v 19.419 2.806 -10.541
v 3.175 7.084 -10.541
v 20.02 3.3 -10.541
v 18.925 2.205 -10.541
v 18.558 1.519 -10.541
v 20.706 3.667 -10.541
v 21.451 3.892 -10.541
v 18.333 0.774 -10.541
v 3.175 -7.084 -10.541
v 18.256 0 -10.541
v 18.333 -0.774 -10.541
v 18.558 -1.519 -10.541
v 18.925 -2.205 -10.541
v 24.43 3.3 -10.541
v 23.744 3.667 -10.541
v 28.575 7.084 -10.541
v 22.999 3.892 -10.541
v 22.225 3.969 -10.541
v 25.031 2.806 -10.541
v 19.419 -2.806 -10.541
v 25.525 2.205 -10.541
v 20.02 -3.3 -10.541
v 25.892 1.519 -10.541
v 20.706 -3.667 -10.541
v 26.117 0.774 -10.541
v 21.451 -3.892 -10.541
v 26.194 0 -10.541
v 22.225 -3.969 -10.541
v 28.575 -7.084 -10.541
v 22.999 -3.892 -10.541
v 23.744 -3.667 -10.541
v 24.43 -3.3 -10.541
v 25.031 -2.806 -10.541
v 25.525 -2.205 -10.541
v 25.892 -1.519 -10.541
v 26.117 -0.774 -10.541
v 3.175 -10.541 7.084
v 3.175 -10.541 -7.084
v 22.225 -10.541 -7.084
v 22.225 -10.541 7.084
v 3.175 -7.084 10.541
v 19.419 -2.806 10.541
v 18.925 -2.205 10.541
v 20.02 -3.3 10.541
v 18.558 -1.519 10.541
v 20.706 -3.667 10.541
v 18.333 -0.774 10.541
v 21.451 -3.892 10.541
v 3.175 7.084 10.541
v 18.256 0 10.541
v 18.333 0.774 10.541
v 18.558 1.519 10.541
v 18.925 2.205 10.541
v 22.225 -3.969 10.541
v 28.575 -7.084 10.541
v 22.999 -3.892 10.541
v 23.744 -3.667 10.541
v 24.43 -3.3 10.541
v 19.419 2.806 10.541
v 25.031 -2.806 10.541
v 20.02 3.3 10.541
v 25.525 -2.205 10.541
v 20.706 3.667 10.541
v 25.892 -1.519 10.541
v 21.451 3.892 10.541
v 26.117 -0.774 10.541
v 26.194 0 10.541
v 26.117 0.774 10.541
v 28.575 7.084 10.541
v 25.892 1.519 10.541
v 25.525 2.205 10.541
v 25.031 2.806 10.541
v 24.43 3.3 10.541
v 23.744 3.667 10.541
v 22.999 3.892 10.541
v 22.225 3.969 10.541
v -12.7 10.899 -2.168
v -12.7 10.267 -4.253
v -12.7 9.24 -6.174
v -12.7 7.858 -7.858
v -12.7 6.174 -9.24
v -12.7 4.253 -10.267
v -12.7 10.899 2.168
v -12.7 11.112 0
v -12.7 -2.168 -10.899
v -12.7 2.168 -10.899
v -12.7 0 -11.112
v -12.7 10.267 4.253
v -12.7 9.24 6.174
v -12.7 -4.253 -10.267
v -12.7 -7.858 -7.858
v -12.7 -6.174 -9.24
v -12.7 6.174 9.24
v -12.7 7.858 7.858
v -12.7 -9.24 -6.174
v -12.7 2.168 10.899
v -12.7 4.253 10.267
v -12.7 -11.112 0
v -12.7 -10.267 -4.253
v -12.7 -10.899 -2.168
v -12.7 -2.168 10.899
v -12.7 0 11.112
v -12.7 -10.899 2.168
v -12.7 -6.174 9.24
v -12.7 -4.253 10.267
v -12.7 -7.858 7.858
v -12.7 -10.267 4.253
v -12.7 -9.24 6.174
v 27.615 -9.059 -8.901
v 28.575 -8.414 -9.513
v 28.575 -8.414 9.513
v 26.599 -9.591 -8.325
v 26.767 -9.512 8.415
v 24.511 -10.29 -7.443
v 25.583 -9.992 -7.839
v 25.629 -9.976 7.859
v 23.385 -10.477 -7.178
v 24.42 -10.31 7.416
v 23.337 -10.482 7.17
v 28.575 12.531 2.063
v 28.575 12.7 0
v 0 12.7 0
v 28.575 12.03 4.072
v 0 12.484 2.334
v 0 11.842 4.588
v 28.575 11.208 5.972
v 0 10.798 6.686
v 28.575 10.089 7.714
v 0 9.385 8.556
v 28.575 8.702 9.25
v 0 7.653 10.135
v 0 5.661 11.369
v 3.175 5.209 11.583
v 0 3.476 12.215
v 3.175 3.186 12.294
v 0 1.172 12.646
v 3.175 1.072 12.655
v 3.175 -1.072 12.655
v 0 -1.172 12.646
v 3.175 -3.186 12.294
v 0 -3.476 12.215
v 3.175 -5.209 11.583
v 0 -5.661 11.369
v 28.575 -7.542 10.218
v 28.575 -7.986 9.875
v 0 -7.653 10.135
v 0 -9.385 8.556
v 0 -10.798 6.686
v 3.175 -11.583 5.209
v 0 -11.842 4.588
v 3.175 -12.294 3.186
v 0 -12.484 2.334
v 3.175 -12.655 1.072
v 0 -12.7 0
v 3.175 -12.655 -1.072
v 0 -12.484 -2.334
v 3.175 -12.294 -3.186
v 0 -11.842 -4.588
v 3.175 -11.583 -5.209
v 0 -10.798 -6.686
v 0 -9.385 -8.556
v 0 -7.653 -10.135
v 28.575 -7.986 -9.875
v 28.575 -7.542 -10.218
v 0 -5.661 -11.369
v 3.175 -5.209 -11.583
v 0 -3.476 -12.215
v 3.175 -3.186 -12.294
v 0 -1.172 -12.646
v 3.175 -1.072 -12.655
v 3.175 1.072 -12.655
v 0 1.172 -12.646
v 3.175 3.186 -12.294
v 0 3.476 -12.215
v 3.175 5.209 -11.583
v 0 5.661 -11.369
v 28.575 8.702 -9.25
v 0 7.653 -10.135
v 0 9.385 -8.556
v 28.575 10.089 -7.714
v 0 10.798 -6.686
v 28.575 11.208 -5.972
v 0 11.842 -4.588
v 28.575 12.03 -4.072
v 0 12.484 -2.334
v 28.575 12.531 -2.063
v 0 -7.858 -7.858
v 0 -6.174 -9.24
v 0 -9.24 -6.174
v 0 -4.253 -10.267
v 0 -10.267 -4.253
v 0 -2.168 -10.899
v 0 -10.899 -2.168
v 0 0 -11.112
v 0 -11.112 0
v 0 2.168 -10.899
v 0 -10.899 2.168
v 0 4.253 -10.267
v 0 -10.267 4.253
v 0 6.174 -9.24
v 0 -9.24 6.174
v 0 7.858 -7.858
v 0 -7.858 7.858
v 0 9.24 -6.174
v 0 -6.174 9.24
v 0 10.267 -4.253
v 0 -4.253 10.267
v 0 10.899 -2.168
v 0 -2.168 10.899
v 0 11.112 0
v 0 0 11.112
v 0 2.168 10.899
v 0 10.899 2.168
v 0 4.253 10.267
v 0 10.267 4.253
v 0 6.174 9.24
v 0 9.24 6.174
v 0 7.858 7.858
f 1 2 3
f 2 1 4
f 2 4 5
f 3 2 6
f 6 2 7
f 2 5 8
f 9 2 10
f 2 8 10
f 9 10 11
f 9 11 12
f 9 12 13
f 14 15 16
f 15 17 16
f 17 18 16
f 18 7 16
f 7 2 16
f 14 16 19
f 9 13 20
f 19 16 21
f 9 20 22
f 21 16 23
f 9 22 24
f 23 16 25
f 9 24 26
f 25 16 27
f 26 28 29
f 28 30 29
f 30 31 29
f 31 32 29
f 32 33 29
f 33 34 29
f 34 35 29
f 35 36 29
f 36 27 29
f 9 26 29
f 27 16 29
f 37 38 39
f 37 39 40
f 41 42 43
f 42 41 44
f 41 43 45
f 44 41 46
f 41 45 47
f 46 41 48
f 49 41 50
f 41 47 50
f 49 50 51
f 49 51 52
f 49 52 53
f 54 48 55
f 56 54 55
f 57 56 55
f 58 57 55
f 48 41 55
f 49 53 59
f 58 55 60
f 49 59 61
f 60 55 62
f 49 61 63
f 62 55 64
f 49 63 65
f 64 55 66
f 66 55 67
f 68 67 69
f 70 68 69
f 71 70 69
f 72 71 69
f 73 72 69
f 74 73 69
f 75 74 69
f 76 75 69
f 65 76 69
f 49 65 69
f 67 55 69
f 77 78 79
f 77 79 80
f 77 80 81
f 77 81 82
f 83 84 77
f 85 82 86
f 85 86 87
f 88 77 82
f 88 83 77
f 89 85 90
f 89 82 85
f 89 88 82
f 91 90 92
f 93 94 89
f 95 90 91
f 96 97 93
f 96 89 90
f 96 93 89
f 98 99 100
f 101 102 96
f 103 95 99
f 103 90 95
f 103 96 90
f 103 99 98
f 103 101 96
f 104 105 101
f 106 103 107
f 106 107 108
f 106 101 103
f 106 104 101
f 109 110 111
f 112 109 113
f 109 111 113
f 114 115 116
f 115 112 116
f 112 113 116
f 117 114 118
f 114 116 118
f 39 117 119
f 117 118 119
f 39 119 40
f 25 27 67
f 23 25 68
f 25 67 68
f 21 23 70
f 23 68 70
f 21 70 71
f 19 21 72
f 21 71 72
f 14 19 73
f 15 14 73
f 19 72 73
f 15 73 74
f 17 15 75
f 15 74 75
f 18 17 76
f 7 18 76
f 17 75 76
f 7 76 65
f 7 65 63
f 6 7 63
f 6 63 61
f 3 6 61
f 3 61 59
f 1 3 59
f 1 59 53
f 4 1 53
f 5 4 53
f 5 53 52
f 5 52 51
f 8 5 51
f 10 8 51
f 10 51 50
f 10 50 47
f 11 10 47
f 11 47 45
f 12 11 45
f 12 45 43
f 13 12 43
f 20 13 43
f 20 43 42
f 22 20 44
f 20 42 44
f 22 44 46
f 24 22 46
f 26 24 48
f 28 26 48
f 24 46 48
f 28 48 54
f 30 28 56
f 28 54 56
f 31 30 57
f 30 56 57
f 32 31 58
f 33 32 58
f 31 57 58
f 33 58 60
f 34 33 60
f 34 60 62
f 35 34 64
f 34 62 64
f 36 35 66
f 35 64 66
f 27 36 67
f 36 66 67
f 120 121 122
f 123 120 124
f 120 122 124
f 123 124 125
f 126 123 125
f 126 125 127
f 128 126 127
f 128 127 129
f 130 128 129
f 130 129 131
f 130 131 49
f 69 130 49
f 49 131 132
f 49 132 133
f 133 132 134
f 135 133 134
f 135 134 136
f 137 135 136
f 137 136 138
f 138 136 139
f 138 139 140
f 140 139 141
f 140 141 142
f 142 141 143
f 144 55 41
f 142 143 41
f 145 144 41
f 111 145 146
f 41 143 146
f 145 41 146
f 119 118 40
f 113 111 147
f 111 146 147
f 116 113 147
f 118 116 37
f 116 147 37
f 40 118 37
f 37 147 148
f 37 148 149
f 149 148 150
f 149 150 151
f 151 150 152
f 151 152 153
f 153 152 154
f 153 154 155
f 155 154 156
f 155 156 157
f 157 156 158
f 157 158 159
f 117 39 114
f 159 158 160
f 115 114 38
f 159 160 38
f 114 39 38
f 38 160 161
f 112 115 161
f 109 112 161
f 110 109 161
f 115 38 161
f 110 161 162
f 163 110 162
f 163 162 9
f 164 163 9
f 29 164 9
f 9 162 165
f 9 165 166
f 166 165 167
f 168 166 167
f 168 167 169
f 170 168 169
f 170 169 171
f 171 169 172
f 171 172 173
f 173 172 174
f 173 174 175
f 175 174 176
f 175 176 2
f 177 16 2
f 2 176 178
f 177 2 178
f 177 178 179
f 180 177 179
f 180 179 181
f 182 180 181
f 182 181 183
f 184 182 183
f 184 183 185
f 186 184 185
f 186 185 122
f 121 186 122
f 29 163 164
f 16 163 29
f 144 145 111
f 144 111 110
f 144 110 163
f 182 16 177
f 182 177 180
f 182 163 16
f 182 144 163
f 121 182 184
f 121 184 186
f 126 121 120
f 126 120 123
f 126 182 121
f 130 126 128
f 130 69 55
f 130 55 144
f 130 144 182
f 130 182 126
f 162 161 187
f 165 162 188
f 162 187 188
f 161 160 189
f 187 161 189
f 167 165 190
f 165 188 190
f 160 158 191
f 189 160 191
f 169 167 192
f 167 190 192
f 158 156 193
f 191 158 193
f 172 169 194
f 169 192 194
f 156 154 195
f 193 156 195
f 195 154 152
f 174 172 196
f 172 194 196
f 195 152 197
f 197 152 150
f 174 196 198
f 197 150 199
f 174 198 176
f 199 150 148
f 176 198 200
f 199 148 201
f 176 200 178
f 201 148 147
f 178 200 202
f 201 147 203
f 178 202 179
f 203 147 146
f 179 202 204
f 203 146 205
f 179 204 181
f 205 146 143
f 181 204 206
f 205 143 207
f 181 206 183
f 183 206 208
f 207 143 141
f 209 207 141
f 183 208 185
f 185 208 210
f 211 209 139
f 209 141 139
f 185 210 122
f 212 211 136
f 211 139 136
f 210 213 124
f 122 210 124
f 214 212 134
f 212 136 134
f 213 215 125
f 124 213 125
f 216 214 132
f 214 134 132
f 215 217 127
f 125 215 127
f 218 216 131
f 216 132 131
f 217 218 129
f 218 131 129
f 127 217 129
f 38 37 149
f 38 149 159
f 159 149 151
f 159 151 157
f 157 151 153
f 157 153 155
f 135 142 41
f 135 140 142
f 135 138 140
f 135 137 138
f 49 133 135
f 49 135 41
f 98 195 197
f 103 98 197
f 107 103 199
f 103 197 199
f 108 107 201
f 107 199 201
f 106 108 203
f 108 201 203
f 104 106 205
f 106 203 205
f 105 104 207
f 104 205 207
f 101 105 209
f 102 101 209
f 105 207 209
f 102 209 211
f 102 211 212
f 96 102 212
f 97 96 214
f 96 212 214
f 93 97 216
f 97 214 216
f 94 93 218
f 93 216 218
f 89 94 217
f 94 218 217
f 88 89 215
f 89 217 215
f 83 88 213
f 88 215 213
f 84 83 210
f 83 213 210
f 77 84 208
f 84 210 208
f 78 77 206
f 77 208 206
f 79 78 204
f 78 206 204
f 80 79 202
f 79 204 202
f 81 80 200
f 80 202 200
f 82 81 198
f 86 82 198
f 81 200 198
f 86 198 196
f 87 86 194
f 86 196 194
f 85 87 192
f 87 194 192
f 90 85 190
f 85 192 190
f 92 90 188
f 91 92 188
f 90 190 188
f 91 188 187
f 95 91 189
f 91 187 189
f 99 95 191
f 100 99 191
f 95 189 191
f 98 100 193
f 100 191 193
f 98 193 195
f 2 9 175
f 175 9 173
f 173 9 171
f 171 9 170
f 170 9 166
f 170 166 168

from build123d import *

# Parameters (mm, degrees)
F0_R     = 12.7
F1_DEPTH = 28.575
F2_R     = 11.1125
F3_DEPTH = 12.7
F5_DEPTH = 25.4
F6_R     = 3.96875
F7_DEPTH = 23.242
F9_DEPTH = 23.242


with BuildPart() as f1:
    # F0 (on Right) → F1 (new body)
    with BuildSketch(Plane.YZ):
        Circle(F0_R)
    extrude(amount=F1_DEPTH)

    # F2 (on face) → F3 (join)
    with BuildSketch(Plane(origin=(0, 0, 0), x_dir=(0, -1, 0), z_dir=(-1, 0, 0))):
        Circle(F2_R)
    extrude(amount=F3_DEPTH)

    # F4 (on face) → F5 (cut)
    with BuildSketch(Plane.YZ.offset(28.575)):
        with BuildLine():
            Line((-10.541, 7.0835950618), (-10.541, 10.541))
            Line((-10.541, 10.541), (-7.0835950618, 10.541))
            ThreePointArc((-7.0835950618, 10.541), (0, 12.7), (7.0835950618, 10.541))
            Line((7.0835950618, 10.541), (14.6175222471, 10.541))
            Line((14.6175222471, 10.541), (14.6175222471, 13.3875589818))
            Line((14.6175222471, 13.3875589818), (-14.6175222471, 13.3875589818))
            Line((-14.6175222471, 13.3875589818), (-14.6175222471, -13.3875589818))
            Line((-14.6175222471, -13.3875589818), (14.6175222471, -13.3875589818))
            Line((14.6175222471, -13.3875589818), (14.6175222471, -10.541))
            Line((14.6175222471, -10.541), (7.0835950618, -10.541))
            ThreePointArc((7.0835950618, -10.541), (0, -12.7), (-7.0835950618, -10.541))
            Line((-7.0835950618, -10.541), (-10.541, -10.541))
            Line((-10.541, -10.541), (-10.541, -7.0835950618))
            ThreePointArc((-10.541, -7.0835950618), (-12.7, 0), (-10.541, 7.0835950618))
        make_face()
        with BuildLine():
            ThreePointArc((7.0835950618, 10.541), (0, 12.7), (-7.0835950618, 10.541))
            Line((-7.0835950618, 10.541), (7.0835950618, 10.541))
        make_face()
        with BuildLine():
            Line((-10.541, -7.0835950618), (-10.541, 7.0835950618))
            ThreePointArc((-10.541, 7.0835950618), (-12.7, 0), (-10.541, -7.0835950618))
        make_face()
        with BuildLine():
            Line((7.0835950618, -10.541), (-7.0835950618, -10.541))
            ThreePointArc((-7.0835950618, -10.541), (0, -12.7), (7.0835950618, -10.541))
        make_face()
    extrude(amount=-F5_DEPTH, mode=Mode.SUBTRACT)

    # F6 (on face) → F7 (cut, through all)
    with BuildSketch(Plane.XY.offset(10.541)):
        with Locations((22.225, 0)):
            Circle(F6_R)
    extrude(amount=-F7_DEPTH, mode=Mode.SUBTRACT)

    # F8 (on face) → F9 (cut, through all)
    with BuildSketch(Plane.XY.offset(10.541)):
        with BuildLine():
            ThreePointArc((32.766, 0), (29.6786125805, -7.4536125805), (22.225, -10.541))
            Line((22.225, -10.541), (22.225, -14.2959095994))
            ThreePointArc((22.225, -14.2959095994), (32.333734621, -10.108734621), (36.5209095994, 0))
            Line((36.5209095994, 0), (32.766, 0))
        make_face()
    extrude(amount=-F9_DEPTH, mode=Mode.SUBTRACT)


solid = f1.part
